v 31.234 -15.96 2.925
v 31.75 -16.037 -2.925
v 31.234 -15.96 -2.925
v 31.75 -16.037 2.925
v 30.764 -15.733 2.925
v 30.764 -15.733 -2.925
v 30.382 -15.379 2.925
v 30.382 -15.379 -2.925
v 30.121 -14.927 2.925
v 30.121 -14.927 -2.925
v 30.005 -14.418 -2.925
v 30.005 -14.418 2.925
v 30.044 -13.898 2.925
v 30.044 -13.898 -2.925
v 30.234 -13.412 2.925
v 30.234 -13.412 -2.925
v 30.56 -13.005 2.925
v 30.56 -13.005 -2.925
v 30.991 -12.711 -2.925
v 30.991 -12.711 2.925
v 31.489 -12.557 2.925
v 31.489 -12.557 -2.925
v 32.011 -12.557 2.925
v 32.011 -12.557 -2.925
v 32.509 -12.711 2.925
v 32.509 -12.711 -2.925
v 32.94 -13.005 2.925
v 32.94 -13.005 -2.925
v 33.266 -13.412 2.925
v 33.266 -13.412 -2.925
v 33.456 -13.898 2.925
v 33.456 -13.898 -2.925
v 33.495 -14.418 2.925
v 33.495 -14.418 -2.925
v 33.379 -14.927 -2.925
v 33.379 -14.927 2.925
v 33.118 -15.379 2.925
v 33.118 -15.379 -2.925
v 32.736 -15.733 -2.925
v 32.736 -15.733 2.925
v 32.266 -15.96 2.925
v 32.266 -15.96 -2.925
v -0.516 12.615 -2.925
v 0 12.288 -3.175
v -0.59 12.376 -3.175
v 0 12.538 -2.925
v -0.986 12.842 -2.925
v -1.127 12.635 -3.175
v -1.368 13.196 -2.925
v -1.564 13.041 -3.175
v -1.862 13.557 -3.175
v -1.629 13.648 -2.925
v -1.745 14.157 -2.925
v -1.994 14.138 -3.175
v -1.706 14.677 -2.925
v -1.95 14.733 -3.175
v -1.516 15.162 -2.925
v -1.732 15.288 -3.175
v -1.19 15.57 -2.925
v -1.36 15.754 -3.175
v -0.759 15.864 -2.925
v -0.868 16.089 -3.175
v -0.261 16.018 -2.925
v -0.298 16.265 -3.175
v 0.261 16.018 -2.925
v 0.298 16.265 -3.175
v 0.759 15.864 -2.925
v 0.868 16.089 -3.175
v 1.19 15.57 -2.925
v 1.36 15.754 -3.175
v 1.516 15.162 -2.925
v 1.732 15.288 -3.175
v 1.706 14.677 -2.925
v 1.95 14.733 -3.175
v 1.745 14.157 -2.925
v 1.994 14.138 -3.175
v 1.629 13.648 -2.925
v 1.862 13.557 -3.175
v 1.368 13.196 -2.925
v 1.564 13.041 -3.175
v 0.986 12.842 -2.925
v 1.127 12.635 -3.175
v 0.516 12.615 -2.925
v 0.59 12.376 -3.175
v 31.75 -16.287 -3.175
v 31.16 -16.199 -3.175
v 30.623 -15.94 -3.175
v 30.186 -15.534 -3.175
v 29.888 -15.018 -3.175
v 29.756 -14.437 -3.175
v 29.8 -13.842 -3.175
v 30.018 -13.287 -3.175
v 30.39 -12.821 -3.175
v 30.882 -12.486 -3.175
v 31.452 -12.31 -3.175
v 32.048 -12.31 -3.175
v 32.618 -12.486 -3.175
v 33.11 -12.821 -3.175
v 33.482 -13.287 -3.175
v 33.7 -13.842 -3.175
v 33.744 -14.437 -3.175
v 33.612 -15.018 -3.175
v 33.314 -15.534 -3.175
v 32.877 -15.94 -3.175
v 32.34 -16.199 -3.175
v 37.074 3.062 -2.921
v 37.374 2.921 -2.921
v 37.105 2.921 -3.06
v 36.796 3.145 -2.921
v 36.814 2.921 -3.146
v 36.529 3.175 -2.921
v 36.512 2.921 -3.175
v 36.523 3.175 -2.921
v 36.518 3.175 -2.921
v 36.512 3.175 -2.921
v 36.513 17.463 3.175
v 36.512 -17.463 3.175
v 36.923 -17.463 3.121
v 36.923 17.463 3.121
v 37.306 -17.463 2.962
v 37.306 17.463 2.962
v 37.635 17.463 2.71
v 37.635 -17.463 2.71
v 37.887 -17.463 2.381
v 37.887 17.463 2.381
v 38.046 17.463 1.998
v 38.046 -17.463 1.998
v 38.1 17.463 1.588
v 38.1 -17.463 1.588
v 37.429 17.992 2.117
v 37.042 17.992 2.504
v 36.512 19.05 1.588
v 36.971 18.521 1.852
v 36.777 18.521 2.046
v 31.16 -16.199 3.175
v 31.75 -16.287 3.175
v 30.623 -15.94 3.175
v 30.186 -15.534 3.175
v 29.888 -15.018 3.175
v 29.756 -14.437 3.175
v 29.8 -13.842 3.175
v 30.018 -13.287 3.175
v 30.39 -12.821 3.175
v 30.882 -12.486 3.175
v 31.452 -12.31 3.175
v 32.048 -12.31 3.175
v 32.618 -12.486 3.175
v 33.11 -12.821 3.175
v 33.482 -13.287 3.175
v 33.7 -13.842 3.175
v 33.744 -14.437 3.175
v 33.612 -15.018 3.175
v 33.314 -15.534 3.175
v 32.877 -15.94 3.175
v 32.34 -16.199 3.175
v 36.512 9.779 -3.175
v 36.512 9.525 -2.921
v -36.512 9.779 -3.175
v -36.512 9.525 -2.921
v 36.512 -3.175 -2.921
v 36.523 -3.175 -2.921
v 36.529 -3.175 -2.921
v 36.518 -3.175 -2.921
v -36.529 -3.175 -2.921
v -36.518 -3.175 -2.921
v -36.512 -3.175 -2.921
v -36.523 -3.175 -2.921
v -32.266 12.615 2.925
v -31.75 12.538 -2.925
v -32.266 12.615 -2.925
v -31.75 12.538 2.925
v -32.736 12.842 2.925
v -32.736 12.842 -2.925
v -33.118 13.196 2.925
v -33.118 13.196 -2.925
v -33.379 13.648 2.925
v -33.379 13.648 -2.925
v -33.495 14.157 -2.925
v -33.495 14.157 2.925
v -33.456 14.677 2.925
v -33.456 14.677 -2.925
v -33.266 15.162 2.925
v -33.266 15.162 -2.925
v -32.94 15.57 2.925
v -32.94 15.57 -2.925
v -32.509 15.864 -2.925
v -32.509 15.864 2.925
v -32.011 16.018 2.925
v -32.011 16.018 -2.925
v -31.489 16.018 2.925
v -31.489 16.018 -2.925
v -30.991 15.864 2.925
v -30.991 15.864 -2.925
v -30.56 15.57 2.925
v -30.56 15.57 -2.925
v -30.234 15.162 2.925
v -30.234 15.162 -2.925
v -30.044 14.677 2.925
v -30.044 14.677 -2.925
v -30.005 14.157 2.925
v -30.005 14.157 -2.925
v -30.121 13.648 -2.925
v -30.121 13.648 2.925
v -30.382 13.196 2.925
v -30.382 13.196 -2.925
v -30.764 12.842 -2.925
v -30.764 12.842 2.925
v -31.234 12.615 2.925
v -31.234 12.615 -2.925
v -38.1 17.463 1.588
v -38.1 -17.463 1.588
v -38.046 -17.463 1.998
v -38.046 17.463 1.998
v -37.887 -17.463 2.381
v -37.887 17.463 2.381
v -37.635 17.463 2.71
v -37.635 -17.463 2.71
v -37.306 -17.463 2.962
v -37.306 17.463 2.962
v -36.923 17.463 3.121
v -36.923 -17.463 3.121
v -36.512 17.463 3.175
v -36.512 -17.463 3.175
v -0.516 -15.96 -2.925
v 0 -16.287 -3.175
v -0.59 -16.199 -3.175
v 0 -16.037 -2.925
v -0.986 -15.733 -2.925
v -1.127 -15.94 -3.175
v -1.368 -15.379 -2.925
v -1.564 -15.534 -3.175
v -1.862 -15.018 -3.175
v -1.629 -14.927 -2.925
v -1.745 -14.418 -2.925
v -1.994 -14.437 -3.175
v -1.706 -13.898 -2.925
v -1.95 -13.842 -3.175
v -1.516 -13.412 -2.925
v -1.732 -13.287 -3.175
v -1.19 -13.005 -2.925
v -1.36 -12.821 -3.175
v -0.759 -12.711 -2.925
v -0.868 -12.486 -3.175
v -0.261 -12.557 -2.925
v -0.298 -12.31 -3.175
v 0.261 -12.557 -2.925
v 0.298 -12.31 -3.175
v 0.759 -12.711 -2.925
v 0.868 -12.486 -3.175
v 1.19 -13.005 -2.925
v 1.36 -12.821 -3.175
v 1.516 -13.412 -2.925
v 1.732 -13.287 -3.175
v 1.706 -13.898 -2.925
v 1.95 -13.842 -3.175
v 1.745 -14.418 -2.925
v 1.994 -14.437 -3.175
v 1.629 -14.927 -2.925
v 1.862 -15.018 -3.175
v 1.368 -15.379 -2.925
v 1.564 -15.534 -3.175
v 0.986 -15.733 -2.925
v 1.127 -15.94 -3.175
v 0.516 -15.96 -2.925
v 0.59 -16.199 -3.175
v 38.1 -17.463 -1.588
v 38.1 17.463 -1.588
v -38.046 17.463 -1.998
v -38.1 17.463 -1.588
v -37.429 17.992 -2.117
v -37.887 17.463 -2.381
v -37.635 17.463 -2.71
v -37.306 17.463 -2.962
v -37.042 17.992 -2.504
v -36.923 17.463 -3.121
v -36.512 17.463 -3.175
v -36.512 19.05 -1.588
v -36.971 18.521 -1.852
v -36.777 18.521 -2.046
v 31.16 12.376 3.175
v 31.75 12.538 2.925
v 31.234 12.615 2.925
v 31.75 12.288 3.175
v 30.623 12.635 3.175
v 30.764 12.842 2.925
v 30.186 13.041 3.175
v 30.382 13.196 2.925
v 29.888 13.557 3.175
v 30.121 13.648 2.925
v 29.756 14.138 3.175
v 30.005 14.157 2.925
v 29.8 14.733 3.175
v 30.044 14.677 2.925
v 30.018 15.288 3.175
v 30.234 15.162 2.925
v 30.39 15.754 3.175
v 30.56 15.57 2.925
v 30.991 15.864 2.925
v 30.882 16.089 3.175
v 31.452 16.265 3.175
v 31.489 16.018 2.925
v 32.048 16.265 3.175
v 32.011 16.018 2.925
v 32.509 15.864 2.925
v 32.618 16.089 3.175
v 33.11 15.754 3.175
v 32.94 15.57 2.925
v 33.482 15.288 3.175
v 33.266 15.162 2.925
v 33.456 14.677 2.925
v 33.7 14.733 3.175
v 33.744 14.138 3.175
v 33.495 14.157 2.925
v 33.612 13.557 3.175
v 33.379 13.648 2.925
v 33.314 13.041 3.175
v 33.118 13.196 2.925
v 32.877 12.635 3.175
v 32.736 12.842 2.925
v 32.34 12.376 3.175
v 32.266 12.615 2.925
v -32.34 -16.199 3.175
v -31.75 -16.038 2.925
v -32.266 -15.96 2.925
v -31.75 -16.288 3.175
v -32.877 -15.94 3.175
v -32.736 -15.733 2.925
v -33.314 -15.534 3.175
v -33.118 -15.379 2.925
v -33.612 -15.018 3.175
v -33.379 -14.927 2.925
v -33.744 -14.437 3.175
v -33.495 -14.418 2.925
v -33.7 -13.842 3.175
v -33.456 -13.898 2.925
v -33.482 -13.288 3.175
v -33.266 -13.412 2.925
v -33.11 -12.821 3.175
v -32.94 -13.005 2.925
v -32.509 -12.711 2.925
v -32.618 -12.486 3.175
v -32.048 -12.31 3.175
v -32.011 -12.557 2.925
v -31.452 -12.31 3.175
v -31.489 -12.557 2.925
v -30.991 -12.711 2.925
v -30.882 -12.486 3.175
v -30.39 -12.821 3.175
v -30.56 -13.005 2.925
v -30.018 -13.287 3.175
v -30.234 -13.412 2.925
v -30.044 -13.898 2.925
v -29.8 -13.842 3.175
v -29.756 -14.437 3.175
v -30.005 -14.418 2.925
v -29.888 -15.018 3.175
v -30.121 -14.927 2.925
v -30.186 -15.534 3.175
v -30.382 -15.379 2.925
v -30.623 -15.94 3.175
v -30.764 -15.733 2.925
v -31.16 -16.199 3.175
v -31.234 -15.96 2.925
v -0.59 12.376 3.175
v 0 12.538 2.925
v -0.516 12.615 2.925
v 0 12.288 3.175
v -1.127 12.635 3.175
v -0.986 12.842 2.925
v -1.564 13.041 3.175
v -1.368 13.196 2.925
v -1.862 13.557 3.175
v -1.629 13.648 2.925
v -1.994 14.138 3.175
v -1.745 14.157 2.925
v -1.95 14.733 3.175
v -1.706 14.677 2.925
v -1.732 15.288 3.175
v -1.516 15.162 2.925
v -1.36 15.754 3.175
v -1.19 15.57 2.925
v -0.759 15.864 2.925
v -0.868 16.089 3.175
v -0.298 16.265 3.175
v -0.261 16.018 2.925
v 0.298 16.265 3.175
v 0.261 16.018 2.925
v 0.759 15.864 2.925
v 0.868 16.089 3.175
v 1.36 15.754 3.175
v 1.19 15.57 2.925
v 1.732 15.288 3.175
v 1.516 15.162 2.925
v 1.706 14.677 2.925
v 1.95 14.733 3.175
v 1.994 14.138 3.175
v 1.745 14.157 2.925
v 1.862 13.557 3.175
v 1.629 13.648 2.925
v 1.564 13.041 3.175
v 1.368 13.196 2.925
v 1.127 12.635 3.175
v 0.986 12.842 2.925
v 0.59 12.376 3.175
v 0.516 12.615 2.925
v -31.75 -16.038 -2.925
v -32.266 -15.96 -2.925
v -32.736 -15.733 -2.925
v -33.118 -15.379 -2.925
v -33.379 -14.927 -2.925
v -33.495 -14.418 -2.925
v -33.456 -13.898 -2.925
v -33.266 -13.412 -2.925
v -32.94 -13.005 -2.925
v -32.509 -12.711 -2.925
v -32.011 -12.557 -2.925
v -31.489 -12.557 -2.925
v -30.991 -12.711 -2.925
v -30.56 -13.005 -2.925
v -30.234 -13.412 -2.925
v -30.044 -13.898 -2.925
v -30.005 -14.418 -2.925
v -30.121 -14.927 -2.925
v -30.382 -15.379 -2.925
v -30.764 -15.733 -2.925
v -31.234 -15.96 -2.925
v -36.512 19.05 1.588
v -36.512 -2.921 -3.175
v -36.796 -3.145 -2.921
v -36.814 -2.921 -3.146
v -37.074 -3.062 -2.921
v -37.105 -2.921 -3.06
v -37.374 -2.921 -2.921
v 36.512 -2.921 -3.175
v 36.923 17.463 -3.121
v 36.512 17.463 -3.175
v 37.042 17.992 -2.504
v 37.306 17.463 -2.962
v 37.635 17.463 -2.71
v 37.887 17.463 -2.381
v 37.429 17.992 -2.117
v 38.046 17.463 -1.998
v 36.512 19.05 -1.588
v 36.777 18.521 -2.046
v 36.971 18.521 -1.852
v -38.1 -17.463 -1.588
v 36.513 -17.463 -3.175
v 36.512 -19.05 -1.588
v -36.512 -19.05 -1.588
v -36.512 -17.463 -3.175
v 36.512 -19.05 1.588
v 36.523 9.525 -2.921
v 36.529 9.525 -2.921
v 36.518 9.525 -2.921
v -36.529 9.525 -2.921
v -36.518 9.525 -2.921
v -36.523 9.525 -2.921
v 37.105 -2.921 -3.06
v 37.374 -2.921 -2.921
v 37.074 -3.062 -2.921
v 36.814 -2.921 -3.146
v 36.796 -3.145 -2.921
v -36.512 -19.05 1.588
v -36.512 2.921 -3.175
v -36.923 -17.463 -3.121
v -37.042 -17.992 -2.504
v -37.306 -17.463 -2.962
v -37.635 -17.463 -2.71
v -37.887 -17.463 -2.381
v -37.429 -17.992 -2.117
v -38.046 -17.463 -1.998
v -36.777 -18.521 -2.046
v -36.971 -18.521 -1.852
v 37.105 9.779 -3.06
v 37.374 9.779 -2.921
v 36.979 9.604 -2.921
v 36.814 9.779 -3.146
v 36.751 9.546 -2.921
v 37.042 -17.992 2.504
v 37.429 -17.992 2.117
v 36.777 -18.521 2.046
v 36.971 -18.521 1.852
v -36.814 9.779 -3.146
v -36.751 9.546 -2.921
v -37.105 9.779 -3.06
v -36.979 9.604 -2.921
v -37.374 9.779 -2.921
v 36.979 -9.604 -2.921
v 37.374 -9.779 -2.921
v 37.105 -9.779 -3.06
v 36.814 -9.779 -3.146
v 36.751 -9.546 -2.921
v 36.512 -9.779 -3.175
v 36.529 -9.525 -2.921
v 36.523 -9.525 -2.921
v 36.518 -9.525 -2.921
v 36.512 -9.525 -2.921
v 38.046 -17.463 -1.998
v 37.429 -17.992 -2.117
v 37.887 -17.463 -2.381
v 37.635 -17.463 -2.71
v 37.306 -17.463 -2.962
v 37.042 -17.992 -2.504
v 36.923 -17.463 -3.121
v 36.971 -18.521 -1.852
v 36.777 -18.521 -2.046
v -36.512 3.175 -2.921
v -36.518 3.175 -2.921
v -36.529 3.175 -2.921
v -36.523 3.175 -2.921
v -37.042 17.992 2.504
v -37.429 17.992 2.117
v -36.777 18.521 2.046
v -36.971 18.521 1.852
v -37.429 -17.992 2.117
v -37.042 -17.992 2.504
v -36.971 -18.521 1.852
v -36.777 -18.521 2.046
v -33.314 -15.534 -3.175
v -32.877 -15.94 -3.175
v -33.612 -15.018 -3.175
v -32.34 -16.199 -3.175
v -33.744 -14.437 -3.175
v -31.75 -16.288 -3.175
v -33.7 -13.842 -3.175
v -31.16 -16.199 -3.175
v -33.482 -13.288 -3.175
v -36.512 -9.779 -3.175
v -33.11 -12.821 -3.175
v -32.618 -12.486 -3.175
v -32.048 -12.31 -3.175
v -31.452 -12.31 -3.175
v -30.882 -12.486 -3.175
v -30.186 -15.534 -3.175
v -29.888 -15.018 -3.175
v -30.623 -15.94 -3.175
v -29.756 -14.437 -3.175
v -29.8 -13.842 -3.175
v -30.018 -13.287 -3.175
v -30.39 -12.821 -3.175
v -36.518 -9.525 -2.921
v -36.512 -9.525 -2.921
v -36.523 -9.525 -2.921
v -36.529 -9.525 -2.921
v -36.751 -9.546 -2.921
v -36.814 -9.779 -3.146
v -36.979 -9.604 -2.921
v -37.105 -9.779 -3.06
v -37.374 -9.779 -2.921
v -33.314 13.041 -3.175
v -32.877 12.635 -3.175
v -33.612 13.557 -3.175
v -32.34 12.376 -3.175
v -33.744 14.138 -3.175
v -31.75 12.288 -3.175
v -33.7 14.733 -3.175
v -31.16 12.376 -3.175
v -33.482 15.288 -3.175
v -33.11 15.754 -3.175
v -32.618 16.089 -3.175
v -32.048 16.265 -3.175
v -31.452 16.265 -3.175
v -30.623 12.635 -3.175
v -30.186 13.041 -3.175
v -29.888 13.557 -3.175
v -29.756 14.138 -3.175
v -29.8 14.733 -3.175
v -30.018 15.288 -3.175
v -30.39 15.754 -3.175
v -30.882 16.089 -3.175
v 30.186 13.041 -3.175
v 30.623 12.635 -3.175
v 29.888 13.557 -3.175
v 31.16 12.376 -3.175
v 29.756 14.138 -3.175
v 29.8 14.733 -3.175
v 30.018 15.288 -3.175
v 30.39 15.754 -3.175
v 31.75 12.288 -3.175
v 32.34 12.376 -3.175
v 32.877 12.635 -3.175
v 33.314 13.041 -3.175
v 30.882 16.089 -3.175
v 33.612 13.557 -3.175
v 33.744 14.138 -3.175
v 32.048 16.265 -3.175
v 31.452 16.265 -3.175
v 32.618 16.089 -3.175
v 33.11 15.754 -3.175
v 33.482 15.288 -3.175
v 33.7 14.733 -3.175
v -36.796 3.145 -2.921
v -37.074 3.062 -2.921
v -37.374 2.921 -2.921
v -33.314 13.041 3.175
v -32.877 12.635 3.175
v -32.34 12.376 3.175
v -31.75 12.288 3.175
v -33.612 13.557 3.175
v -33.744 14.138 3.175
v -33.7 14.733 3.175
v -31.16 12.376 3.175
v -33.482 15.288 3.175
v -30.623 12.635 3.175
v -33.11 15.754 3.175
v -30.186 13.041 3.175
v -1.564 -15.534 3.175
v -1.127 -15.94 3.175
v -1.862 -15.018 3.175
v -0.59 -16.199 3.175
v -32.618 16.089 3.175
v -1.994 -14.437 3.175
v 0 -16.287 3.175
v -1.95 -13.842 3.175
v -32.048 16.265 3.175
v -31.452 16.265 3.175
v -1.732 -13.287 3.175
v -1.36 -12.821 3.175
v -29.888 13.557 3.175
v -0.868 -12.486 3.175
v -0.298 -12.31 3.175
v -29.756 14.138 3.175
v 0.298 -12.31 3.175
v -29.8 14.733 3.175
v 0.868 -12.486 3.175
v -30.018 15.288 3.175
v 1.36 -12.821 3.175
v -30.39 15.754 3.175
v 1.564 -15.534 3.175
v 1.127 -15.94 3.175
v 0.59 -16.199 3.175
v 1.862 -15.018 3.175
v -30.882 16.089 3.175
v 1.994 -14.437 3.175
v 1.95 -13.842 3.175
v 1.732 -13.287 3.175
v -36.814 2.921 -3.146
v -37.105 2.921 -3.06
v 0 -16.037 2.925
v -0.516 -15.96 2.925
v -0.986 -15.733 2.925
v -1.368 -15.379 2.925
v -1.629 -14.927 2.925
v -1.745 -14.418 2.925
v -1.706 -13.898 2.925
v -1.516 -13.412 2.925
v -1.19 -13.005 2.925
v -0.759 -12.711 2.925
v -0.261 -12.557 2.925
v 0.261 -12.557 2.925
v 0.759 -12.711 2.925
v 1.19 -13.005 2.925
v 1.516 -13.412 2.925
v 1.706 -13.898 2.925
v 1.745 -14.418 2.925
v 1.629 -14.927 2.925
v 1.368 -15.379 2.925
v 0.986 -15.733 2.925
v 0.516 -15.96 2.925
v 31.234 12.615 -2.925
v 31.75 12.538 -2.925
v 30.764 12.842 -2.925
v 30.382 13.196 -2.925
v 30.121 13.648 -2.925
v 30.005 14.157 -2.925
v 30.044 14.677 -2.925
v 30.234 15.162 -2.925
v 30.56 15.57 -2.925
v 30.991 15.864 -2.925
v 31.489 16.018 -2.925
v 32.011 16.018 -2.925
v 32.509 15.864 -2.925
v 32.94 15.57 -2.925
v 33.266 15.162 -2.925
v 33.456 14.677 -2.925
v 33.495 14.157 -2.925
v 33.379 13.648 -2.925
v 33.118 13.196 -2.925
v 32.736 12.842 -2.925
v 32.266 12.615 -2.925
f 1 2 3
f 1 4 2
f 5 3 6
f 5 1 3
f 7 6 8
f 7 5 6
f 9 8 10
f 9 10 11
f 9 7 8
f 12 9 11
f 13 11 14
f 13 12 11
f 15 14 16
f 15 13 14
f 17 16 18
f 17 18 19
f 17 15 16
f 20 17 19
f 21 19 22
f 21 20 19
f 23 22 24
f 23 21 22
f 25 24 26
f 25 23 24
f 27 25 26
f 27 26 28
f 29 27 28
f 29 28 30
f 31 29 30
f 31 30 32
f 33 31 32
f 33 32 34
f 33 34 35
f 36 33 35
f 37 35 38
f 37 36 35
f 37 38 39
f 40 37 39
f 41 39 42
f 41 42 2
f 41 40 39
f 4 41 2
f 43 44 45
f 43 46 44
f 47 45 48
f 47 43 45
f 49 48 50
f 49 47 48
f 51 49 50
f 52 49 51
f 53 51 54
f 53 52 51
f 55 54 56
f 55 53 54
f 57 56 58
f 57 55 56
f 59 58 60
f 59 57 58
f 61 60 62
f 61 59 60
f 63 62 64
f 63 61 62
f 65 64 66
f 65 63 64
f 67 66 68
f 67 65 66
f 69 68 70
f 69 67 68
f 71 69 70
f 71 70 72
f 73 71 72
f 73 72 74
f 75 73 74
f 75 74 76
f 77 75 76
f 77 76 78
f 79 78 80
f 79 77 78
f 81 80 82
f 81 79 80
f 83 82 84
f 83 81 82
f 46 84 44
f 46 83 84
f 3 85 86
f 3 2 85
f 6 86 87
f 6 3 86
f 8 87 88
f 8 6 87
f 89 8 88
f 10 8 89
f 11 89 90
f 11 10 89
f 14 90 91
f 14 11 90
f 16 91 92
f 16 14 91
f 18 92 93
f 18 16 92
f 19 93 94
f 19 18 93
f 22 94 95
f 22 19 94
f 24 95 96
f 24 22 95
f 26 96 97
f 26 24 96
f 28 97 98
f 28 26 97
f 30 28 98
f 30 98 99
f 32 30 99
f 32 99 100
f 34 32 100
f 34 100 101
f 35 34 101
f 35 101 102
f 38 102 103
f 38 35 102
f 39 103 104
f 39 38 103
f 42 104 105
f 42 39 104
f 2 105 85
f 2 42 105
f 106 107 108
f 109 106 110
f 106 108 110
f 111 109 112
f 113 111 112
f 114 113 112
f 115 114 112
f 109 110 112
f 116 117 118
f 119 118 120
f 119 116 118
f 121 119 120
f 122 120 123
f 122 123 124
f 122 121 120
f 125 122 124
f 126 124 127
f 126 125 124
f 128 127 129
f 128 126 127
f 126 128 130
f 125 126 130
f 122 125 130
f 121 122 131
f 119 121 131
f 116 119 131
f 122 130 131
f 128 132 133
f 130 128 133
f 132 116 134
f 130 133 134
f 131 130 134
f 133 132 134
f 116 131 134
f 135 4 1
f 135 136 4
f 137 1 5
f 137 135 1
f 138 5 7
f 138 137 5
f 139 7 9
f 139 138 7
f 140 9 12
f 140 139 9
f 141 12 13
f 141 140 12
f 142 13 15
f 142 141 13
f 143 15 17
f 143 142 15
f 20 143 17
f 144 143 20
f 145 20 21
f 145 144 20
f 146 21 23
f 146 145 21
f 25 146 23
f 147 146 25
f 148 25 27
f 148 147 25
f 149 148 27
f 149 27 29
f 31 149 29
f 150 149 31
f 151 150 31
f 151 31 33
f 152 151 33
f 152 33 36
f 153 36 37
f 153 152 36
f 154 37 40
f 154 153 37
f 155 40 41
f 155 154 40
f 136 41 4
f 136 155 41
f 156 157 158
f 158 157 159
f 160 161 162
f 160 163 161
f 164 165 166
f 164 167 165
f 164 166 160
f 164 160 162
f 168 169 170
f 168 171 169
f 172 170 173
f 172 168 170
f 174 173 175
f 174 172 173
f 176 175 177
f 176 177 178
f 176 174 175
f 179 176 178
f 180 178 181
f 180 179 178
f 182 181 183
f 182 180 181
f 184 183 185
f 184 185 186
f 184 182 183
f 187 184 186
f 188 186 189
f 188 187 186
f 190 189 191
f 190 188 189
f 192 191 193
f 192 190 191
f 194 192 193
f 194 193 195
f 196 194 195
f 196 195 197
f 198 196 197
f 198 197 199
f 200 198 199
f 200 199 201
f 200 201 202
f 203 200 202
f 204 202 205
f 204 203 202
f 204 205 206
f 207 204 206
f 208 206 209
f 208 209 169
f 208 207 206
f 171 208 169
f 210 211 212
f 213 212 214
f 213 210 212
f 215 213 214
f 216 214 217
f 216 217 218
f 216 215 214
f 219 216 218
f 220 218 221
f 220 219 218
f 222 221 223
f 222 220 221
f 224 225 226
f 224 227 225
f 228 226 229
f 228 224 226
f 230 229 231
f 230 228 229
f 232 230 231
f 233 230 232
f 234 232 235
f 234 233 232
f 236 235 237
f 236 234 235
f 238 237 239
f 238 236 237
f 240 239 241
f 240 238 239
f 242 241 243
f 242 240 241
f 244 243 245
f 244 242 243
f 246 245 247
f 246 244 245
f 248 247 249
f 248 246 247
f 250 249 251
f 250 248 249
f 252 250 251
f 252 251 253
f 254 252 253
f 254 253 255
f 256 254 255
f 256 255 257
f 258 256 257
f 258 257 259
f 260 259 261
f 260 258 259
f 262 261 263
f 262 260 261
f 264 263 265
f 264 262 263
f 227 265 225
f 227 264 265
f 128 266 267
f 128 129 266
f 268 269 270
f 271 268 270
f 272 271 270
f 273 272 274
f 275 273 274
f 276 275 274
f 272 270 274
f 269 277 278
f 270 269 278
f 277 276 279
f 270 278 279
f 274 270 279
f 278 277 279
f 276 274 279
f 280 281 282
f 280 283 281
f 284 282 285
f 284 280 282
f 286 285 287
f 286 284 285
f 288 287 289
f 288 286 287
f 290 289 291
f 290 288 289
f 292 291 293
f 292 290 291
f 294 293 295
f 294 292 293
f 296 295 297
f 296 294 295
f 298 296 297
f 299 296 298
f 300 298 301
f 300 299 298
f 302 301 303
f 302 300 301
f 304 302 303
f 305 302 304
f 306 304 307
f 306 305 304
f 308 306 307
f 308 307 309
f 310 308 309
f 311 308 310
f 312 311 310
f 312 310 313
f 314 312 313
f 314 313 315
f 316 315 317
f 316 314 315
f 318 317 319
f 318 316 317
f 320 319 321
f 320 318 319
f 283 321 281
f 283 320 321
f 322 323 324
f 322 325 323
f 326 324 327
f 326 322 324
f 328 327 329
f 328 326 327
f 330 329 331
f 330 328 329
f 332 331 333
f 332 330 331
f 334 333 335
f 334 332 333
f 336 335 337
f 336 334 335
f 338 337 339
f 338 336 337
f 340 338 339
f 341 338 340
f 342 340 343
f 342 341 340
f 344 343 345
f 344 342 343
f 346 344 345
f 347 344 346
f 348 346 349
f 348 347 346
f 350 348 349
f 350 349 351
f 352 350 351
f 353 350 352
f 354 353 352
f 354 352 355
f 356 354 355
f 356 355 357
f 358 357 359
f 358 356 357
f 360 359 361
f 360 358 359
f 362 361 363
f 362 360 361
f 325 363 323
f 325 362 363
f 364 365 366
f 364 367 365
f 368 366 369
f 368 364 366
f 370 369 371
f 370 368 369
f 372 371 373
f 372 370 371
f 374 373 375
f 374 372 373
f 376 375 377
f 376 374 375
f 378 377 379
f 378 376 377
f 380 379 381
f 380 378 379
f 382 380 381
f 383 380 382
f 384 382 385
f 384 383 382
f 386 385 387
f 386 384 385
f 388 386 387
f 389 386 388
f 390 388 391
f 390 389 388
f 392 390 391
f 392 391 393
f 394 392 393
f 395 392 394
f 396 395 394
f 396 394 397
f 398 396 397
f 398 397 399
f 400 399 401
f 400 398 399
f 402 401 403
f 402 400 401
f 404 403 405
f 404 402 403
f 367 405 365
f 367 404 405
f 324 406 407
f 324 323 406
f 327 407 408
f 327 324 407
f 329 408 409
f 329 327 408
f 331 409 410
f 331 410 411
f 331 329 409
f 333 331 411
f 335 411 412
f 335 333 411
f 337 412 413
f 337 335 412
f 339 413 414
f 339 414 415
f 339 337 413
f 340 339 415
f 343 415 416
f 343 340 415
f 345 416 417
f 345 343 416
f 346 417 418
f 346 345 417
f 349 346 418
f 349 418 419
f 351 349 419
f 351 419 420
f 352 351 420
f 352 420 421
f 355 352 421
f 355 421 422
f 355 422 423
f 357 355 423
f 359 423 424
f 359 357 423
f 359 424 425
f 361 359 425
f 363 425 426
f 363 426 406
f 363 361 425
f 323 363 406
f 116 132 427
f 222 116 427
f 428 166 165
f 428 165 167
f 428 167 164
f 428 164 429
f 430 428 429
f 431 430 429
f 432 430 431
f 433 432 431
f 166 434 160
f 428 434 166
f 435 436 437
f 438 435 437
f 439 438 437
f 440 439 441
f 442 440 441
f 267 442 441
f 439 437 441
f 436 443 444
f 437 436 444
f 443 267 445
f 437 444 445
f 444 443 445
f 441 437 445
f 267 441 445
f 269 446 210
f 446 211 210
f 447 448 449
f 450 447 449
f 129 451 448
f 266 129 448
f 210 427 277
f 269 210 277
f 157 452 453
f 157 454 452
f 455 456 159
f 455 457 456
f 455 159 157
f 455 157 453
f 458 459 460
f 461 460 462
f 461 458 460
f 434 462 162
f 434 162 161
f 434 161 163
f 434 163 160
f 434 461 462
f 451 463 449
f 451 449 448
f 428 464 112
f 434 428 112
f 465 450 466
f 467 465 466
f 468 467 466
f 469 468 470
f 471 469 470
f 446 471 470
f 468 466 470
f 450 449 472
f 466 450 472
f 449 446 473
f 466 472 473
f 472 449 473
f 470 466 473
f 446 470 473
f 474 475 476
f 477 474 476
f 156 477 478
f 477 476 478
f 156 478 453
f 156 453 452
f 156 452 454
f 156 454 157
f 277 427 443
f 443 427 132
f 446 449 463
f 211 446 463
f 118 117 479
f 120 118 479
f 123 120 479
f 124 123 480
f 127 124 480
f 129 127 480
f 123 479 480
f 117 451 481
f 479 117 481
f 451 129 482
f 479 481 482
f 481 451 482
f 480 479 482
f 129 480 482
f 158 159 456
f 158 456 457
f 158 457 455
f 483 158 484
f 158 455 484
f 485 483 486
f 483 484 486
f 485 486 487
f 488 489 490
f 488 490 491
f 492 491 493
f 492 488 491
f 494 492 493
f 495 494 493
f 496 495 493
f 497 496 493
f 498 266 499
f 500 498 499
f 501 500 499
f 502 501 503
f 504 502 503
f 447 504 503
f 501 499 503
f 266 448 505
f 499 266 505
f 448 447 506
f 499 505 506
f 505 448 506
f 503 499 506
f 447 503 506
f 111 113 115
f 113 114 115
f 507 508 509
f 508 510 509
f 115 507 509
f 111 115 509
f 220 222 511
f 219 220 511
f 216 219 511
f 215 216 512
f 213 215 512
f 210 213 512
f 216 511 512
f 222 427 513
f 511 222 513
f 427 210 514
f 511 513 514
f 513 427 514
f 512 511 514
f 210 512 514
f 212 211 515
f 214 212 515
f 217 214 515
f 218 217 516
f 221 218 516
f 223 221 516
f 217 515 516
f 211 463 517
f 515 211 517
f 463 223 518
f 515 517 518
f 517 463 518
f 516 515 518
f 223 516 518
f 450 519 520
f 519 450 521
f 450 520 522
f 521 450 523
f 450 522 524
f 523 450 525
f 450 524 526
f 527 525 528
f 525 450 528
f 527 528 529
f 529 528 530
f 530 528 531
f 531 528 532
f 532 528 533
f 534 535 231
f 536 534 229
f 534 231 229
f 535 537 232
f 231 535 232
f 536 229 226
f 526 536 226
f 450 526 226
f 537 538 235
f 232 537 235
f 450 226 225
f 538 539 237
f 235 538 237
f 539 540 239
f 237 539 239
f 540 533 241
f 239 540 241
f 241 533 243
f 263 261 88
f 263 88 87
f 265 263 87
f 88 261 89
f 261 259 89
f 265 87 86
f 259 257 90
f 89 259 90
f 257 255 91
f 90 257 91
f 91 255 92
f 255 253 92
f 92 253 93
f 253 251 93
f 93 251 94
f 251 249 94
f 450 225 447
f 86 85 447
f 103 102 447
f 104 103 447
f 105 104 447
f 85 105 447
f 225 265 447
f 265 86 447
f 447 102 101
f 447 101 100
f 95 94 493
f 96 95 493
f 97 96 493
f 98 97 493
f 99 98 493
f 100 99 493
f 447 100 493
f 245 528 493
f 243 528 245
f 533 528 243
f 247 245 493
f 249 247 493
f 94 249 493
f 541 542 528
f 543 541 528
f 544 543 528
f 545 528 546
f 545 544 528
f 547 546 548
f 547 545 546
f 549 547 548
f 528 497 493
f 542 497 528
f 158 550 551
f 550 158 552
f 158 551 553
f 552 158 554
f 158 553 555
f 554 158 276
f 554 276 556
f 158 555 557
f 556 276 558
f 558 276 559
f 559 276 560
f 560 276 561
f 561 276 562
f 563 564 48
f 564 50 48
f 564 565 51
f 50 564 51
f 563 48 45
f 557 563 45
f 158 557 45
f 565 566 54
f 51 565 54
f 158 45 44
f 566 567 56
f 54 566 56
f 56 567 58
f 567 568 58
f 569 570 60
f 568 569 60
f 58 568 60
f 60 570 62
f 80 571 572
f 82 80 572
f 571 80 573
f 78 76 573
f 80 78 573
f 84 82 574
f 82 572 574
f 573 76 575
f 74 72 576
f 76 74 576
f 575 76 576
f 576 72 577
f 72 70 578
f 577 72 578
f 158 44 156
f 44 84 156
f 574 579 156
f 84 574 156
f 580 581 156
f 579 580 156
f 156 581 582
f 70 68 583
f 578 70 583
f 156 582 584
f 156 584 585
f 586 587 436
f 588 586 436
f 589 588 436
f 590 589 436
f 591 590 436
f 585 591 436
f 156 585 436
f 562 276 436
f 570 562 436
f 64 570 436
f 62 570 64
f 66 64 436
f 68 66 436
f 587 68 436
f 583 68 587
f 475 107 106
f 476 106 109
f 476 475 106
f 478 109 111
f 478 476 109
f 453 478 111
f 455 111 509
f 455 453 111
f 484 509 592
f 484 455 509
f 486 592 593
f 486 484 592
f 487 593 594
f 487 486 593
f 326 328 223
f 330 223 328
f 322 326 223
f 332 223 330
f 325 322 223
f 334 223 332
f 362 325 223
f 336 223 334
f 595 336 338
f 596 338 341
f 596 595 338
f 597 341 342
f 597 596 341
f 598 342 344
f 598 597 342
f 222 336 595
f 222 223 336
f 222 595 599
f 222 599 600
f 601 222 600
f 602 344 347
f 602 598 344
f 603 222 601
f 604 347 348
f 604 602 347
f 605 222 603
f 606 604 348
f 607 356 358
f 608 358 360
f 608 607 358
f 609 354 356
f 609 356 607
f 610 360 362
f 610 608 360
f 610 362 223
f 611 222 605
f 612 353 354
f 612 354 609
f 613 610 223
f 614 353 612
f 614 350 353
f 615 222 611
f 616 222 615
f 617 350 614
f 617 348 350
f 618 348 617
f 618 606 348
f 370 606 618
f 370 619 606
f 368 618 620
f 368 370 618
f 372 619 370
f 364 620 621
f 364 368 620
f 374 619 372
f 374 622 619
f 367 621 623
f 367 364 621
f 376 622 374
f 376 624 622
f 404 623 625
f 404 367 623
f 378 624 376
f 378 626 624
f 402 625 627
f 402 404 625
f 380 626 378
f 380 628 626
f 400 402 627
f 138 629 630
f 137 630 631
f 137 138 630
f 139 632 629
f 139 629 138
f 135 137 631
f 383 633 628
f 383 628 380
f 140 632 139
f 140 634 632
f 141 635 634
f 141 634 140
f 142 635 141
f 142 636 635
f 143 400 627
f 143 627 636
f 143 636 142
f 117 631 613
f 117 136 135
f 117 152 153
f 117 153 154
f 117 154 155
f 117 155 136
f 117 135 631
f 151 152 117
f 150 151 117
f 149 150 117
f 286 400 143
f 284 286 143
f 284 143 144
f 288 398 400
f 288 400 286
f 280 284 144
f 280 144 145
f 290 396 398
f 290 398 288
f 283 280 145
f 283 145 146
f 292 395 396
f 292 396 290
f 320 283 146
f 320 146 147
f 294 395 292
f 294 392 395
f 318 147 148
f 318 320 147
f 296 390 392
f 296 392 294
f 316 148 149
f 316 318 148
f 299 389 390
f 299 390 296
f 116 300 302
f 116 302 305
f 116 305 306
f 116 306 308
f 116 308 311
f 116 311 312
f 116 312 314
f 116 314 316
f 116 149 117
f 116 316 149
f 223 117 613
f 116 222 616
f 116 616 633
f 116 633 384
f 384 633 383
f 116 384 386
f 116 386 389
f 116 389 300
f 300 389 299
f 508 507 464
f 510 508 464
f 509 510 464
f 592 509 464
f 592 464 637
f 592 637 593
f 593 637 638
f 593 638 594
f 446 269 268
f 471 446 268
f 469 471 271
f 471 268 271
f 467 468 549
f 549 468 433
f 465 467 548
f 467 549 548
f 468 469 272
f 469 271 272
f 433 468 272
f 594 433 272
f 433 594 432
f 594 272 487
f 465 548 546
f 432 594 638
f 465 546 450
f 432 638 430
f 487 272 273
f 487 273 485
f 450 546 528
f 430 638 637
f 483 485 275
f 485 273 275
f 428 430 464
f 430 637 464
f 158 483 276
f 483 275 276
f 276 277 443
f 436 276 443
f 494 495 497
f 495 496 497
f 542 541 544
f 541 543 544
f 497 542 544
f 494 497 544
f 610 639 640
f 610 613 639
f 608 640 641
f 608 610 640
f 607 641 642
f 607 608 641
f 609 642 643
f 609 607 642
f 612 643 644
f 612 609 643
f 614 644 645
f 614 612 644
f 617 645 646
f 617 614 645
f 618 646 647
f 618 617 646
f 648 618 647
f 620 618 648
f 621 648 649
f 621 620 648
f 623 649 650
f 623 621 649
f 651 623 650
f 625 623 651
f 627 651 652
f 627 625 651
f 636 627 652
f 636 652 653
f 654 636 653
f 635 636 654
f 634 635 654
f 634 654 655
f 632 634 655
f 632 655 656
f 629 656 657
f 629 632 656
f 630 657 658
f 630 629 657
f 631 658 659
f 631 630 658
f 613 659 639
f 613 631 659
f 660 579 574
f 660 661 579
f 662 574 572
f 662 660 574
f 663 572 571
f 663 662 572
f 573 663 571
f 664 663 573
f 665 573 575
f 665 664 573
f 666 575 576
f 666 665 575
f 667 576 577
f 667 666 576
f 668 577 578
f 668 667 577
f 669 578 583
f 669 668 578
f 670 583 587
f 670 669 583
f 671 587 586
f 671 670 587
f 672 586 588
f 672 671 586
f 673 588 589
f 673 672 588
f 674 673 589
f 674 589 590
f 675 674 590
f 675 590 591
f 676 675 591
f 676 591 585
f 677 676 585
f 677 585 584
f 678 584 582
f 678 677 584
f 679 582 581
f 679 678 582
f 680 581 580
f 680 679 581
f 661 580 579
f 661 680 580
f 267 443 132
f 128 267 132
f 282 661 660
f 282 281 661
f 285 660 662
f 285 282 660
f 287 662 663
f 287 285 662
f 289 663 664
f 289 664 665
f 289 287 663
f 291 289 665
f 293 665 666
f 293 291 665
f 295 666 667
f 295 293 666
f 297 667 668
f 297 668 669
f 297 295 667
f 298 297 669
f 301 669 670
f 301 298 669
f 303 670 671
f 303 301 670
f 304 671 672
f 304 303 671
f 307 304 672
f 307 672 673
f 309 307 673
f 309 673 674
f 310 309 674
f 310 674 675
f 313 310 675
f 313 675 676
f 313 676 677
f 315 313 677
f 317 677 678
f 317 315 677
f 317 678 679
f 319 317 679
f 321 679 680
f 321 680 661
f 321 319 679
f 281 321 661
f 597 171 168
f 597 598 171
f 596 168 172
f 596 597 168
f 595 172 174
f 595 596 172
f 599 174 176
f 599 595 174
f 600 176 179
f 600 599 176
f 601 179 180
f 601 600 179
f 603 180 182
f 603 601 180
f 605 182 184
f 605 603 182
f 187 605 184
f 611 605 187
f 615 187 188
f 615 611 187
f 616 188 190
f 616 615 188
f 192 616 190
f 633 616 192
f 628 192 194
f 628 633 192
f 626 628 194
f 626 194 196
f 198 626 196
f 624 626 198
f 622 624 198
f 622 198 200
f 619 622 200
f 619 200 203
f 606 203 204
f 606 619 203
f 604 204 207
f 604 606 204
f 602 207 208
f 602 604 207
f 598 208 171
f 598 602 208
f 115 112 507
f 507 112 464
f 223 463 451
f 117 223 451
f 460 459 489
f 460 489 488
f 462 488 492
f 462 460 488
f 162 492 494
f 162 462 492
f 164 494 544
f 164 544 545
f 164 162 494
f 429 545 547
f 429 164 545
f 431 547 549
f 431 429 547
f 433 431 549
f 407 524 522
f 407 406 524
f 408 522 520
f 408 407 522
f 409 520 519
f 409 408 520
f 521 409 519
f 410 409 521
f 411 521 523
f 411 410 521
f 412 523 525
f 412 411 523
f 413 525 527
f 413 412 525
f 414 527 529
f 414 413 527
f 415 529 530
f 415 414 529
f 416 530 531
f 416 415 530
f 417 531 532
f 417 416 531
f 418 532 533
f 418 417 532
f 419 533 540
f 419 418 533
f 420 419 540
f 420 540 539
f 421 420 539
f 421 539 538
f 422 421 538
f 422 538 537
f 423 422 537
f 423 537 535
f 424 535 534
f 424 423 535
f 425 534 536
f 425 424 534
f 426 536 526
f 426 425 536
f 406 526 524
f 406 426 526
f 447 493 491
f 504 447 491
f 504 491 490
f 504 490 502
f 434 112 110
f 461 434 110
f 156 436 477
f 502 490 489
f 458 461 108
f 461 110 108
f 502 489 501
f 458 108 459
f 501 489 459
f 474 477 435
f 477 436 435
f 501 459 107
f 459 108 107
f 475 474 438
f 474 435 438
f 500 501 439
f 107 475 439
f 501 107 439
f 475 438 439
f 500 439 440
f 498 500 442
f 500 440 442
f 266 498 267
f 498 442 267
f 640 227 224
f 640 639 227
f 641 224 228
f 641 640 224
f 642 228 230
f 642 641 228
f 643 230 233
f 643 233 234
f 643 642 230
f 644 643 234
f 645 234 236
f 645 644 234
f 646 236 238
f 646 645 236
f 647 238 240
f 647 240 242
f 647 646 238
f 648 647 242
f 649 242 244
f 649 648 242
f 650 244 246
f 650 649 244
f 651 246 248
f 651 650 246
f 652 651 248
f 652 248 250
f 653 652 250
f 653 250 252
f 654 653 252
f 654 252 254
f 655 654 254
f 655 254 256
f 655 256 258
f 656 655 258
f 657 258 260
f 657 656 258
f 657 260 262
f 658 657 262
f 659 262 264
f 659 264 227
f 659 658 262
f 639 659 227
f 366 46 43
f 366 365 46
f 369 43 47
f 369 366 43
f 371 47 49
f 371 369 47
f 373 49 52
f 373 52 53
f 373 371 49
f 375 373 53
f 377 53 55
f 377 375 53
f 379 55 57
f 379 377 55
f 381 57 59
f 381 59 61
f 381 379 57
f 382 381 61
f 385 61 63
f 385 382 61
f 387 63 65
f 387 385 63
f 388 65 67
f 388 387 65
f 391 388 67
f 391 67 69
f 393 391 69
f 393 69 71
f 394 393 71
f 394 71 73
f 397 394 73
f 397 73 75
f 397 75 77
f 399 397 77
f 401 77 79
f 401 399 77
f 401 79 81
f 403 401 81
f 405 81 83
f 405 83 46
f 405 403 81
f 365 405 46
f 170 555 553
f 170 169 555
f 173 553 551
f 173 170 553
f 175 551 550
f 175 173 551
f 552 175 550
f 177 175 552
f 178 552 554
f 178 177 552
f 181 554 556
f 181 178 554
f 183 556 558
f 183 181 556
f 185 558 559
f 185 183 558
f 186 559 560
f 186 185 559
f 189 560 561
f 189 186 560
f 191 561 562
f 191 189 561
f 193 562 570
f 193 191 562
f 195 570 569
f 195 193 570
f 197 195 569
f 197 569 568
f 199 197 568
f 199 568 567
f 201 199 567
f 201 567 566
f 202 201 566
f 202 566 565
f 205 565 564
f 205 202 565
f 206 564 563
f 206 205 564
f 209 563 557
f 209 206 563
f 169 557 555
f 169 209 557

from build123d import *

# Parameters (mm, degrees)
SKETCH1_W                     = 76.2
SKETCH1_H                     = 38.1
BOSS_EXTRUDE1_DEPTH           = 3.175
SKETCH1_2_W                   = 76.2
SKETCH1_2_H                   = 38.1
BOSS_EXTRUDE2_DEPTH           = 3.175
SKETCH10_W                    = 76.2
SKETCH10_H                    = 6.35
CUT_EXTRUDE2_DEPTH            = 0.254
M3_CLEARANCE_HOLE1_AT_2_COUNT = 2
M3_CLEARANCE_HOLE1_AT_2_PITCH = 28.575
M3_CLEARANCE_HOLE1_AT_3_COUNT = 2
M3_CLEARANCE_HOLE1_AT_3_PITCH = 31.75
M3_CLEARANCE_HOLE1_AT_4_COUNT = 2
M3_CLEARANCE_HOLE1_AT_4_PITCH = 42.715256349
M3_CLEARANCE_HOLE1_AT_5_COUNT = 2
M3_CLEARANCE_HOLE1_AT_5_PITCH = 63.5
M3_CLEARANCE_HOLE1_AT_6_COUNT = 2
M3_CLEARANCE_HOLE1_AT_6_PITCH = 69.633186233
FILLET1_R                     = 1.5875
CHAMFER1_SIZE                 = 1.5875
CHAMFER3_SIZE                 = 0.254


with BuildPart() as part:
    # Sketch1 → Boss-Extrude1 (new, symmetric)
    with BuildSketch(Plane.XY):
        Rectangle(SKETCH1_W, SKETCH1_H)
    extrude(amount=BOSS_EXTRUDE1_DEPTH, both=True)

    # Sketch1<2> → Boss-Extrude2 (add, symmetric)
    with BuildSketch(Plane.XY):
        Rectangle(SKETCH1_2_W, SKETCH1_2_H)
    extrude(amount=BOSS_EXTRUDE2_DEPTH, both=True)

    # Sketch10 → Cut-Extrude2 (cut)
    with BuildSketch(Plane(origin=(0, 0, -3.175), x_dir=(-1, 0, 0), z_dir=(0, 0, -1))):
        with Locations((0, 6.35)):
            Rectangle(SKETCH10_W, SKETCH10_H)
        with Locations((0, -6.35)):
            Rectangle(SKETCH10_W, SKETCH10_H)
    extrude(amount=-CUT_EXTRUDE2_DEPTH, mode=Mode.SUBTRACT)

    # Sketch4 → M3 Clearance Hole1 (revolve, cut)
    with BuildSketch(Plane(origin=(-31.75, 14.2875, 3.175), x_dir=(0, -1, 0), z_dir=(1, 0, 0))):
        Polygon((0, 0), (0, 6.35), (2, 6.35), (1.75, 6.1), (1.75, 0.25), (2, 0), align=None)
    m3_clearance_hole1 = revolve(axis=Axis((-31.75, 14.2875, 9.525), (0, 0, -1)), mode=Mode.SUBTRACT)

    # M3 Clearance Hole1 at 2: M3 Clearance Hole1 ×2
    with Locations(*[(0, -i * M3_CLEARANCE_HOLE1_AT_2_PITCH, 0) for i in range(1, M3_CLEARANCE_HOLE1_AT_2_COUNT)]):
        add(m3_clearance_hole1, mode=Mode.SUBTRACT)

    # M3 Clearance Hole1 at 3: M3 Clearance Hole1 ×2
    with Locations(*[(i * M3_CLEARANCE_HOLE1_AT_3_PITCH, 0, 0) for i in range(1, M3_CLEARANCE_HOLE1_AT_3_COUNT)]):
        add(m3_clearance_hole1, mode=Mode.SUBTRACT)

    # M3 Clearance Hole1 at 4: M3 Clearance Hole1 ×2
    with Locations(*[Vector(0.7432941462471665, -0.6689647316224495, 0) * (i * M3_CLEARANCE_HOLE1_AT_4_PITCH) for i in range(1, M3_CLEARANCE_HOLE1_AT_4_COUNT)]):
        add(m3_clearance_hole1, mode=Mode.SUBTRACT)

    # M3 Clearance Hole1 at 5: M3 Clearance Hole1 ×2
    with Locations(*[(i * M3_CLEARANCE_HOLE1_AT_5_PITCH, 0, 0) for i in range(1, M3_CLEARANCE_HOLE1_AT_5_COUNT)]):
        add(m3_clearance_hole1, mode=Mode.SUBTRACT)

    # M3 Clearance Hole1 at 6: M3 Clearance Hole1 ×2
    with Locations(*[Vector(0.9119215051751064, -0.4103646773287979, 0) * (i * M3_CLEARANCE_HOLE1_AT_6_PITCH) for i in range(1, M3_CLEARANCE_HOLE1_AT_6_COUNT)]):
        add(m3_clearance_hole1, mode=Mode.SUBTRACT)

    # Fillet1
    fillet1_edges = [part.edges().sort_by_distance(p)[0] for p in [
        (-38.1, -14.2875, -3.175),
        (-38.1, 0, 3.175),
        (38.1, 0, 3.175),
        (38.1, -14.2875, -3.175),
    ]]
    fillet(fillet1_edges, radius=FILLET1_R)

    # Chamfer1
    chamfer1_edges = [part.edges().sort_by_distance(p)[0] for p in [
        (-38.1, -19.05, 0),
        (-38.1, 19.05, 0),
        (0, -19.05, -3.175),
        (38.1, -19.05, 0),
        (0, -19.05, 3.175),
        (37.635032015, -19.05, -2.710032015),
        (37.635032015, -19.05, 2.710032015),
        (-37.635032015, -19.05, 2.710032015),
        (-37.635032015, -19.05, -2.710032015),
        (-2.84e-07, 19.05, -3.175),
        (0, 19.05, 3.175),
        (38.1, 19.05, 0),
        (37.635032015, 19.05, -2.710032015),
        (37.635032015, 19.05, 2.710032015),
        (-37.635032015, 19.05, 2.710032015),
        (-37.635032216, 19.05, -2.710031814),
    ]]
    chamfer(chamfer1_edges, length=CHAMFER1_SIZE)

    # Chamfer3
    chamfer3_edges = [part.edges().sort_by_distance(p)[0] for p in [
        (0, -9.525, -3.175),
        (36.961512806, -9.525, -3.110176509),
        (-36.961512806, -9.525, -3.110176509),
        (2.84e-07, -3.175, -3.175),
        (36.961513079, -3.175, -3.110176428),
        (-36.961512806, -3.175, -3.110176509),
        (-2.84e-07, 3.175, -3.175),
        (36.961512806, 3.175, -3.110176509),
        (-36.961513079, 3.175, -3.110176428),
        (2.84e-07, 9.525, -3.175),
        (36.961513079, 9.525, -3.110176428),
        (-36.961512806, 9.525, -3.110176509),
    ]]
    chamfer(chamfer3_edges, length=CHAMFER3_SIZE - 0.0001)  # a hair under: the kernel refuses the full size


solid = part.part
